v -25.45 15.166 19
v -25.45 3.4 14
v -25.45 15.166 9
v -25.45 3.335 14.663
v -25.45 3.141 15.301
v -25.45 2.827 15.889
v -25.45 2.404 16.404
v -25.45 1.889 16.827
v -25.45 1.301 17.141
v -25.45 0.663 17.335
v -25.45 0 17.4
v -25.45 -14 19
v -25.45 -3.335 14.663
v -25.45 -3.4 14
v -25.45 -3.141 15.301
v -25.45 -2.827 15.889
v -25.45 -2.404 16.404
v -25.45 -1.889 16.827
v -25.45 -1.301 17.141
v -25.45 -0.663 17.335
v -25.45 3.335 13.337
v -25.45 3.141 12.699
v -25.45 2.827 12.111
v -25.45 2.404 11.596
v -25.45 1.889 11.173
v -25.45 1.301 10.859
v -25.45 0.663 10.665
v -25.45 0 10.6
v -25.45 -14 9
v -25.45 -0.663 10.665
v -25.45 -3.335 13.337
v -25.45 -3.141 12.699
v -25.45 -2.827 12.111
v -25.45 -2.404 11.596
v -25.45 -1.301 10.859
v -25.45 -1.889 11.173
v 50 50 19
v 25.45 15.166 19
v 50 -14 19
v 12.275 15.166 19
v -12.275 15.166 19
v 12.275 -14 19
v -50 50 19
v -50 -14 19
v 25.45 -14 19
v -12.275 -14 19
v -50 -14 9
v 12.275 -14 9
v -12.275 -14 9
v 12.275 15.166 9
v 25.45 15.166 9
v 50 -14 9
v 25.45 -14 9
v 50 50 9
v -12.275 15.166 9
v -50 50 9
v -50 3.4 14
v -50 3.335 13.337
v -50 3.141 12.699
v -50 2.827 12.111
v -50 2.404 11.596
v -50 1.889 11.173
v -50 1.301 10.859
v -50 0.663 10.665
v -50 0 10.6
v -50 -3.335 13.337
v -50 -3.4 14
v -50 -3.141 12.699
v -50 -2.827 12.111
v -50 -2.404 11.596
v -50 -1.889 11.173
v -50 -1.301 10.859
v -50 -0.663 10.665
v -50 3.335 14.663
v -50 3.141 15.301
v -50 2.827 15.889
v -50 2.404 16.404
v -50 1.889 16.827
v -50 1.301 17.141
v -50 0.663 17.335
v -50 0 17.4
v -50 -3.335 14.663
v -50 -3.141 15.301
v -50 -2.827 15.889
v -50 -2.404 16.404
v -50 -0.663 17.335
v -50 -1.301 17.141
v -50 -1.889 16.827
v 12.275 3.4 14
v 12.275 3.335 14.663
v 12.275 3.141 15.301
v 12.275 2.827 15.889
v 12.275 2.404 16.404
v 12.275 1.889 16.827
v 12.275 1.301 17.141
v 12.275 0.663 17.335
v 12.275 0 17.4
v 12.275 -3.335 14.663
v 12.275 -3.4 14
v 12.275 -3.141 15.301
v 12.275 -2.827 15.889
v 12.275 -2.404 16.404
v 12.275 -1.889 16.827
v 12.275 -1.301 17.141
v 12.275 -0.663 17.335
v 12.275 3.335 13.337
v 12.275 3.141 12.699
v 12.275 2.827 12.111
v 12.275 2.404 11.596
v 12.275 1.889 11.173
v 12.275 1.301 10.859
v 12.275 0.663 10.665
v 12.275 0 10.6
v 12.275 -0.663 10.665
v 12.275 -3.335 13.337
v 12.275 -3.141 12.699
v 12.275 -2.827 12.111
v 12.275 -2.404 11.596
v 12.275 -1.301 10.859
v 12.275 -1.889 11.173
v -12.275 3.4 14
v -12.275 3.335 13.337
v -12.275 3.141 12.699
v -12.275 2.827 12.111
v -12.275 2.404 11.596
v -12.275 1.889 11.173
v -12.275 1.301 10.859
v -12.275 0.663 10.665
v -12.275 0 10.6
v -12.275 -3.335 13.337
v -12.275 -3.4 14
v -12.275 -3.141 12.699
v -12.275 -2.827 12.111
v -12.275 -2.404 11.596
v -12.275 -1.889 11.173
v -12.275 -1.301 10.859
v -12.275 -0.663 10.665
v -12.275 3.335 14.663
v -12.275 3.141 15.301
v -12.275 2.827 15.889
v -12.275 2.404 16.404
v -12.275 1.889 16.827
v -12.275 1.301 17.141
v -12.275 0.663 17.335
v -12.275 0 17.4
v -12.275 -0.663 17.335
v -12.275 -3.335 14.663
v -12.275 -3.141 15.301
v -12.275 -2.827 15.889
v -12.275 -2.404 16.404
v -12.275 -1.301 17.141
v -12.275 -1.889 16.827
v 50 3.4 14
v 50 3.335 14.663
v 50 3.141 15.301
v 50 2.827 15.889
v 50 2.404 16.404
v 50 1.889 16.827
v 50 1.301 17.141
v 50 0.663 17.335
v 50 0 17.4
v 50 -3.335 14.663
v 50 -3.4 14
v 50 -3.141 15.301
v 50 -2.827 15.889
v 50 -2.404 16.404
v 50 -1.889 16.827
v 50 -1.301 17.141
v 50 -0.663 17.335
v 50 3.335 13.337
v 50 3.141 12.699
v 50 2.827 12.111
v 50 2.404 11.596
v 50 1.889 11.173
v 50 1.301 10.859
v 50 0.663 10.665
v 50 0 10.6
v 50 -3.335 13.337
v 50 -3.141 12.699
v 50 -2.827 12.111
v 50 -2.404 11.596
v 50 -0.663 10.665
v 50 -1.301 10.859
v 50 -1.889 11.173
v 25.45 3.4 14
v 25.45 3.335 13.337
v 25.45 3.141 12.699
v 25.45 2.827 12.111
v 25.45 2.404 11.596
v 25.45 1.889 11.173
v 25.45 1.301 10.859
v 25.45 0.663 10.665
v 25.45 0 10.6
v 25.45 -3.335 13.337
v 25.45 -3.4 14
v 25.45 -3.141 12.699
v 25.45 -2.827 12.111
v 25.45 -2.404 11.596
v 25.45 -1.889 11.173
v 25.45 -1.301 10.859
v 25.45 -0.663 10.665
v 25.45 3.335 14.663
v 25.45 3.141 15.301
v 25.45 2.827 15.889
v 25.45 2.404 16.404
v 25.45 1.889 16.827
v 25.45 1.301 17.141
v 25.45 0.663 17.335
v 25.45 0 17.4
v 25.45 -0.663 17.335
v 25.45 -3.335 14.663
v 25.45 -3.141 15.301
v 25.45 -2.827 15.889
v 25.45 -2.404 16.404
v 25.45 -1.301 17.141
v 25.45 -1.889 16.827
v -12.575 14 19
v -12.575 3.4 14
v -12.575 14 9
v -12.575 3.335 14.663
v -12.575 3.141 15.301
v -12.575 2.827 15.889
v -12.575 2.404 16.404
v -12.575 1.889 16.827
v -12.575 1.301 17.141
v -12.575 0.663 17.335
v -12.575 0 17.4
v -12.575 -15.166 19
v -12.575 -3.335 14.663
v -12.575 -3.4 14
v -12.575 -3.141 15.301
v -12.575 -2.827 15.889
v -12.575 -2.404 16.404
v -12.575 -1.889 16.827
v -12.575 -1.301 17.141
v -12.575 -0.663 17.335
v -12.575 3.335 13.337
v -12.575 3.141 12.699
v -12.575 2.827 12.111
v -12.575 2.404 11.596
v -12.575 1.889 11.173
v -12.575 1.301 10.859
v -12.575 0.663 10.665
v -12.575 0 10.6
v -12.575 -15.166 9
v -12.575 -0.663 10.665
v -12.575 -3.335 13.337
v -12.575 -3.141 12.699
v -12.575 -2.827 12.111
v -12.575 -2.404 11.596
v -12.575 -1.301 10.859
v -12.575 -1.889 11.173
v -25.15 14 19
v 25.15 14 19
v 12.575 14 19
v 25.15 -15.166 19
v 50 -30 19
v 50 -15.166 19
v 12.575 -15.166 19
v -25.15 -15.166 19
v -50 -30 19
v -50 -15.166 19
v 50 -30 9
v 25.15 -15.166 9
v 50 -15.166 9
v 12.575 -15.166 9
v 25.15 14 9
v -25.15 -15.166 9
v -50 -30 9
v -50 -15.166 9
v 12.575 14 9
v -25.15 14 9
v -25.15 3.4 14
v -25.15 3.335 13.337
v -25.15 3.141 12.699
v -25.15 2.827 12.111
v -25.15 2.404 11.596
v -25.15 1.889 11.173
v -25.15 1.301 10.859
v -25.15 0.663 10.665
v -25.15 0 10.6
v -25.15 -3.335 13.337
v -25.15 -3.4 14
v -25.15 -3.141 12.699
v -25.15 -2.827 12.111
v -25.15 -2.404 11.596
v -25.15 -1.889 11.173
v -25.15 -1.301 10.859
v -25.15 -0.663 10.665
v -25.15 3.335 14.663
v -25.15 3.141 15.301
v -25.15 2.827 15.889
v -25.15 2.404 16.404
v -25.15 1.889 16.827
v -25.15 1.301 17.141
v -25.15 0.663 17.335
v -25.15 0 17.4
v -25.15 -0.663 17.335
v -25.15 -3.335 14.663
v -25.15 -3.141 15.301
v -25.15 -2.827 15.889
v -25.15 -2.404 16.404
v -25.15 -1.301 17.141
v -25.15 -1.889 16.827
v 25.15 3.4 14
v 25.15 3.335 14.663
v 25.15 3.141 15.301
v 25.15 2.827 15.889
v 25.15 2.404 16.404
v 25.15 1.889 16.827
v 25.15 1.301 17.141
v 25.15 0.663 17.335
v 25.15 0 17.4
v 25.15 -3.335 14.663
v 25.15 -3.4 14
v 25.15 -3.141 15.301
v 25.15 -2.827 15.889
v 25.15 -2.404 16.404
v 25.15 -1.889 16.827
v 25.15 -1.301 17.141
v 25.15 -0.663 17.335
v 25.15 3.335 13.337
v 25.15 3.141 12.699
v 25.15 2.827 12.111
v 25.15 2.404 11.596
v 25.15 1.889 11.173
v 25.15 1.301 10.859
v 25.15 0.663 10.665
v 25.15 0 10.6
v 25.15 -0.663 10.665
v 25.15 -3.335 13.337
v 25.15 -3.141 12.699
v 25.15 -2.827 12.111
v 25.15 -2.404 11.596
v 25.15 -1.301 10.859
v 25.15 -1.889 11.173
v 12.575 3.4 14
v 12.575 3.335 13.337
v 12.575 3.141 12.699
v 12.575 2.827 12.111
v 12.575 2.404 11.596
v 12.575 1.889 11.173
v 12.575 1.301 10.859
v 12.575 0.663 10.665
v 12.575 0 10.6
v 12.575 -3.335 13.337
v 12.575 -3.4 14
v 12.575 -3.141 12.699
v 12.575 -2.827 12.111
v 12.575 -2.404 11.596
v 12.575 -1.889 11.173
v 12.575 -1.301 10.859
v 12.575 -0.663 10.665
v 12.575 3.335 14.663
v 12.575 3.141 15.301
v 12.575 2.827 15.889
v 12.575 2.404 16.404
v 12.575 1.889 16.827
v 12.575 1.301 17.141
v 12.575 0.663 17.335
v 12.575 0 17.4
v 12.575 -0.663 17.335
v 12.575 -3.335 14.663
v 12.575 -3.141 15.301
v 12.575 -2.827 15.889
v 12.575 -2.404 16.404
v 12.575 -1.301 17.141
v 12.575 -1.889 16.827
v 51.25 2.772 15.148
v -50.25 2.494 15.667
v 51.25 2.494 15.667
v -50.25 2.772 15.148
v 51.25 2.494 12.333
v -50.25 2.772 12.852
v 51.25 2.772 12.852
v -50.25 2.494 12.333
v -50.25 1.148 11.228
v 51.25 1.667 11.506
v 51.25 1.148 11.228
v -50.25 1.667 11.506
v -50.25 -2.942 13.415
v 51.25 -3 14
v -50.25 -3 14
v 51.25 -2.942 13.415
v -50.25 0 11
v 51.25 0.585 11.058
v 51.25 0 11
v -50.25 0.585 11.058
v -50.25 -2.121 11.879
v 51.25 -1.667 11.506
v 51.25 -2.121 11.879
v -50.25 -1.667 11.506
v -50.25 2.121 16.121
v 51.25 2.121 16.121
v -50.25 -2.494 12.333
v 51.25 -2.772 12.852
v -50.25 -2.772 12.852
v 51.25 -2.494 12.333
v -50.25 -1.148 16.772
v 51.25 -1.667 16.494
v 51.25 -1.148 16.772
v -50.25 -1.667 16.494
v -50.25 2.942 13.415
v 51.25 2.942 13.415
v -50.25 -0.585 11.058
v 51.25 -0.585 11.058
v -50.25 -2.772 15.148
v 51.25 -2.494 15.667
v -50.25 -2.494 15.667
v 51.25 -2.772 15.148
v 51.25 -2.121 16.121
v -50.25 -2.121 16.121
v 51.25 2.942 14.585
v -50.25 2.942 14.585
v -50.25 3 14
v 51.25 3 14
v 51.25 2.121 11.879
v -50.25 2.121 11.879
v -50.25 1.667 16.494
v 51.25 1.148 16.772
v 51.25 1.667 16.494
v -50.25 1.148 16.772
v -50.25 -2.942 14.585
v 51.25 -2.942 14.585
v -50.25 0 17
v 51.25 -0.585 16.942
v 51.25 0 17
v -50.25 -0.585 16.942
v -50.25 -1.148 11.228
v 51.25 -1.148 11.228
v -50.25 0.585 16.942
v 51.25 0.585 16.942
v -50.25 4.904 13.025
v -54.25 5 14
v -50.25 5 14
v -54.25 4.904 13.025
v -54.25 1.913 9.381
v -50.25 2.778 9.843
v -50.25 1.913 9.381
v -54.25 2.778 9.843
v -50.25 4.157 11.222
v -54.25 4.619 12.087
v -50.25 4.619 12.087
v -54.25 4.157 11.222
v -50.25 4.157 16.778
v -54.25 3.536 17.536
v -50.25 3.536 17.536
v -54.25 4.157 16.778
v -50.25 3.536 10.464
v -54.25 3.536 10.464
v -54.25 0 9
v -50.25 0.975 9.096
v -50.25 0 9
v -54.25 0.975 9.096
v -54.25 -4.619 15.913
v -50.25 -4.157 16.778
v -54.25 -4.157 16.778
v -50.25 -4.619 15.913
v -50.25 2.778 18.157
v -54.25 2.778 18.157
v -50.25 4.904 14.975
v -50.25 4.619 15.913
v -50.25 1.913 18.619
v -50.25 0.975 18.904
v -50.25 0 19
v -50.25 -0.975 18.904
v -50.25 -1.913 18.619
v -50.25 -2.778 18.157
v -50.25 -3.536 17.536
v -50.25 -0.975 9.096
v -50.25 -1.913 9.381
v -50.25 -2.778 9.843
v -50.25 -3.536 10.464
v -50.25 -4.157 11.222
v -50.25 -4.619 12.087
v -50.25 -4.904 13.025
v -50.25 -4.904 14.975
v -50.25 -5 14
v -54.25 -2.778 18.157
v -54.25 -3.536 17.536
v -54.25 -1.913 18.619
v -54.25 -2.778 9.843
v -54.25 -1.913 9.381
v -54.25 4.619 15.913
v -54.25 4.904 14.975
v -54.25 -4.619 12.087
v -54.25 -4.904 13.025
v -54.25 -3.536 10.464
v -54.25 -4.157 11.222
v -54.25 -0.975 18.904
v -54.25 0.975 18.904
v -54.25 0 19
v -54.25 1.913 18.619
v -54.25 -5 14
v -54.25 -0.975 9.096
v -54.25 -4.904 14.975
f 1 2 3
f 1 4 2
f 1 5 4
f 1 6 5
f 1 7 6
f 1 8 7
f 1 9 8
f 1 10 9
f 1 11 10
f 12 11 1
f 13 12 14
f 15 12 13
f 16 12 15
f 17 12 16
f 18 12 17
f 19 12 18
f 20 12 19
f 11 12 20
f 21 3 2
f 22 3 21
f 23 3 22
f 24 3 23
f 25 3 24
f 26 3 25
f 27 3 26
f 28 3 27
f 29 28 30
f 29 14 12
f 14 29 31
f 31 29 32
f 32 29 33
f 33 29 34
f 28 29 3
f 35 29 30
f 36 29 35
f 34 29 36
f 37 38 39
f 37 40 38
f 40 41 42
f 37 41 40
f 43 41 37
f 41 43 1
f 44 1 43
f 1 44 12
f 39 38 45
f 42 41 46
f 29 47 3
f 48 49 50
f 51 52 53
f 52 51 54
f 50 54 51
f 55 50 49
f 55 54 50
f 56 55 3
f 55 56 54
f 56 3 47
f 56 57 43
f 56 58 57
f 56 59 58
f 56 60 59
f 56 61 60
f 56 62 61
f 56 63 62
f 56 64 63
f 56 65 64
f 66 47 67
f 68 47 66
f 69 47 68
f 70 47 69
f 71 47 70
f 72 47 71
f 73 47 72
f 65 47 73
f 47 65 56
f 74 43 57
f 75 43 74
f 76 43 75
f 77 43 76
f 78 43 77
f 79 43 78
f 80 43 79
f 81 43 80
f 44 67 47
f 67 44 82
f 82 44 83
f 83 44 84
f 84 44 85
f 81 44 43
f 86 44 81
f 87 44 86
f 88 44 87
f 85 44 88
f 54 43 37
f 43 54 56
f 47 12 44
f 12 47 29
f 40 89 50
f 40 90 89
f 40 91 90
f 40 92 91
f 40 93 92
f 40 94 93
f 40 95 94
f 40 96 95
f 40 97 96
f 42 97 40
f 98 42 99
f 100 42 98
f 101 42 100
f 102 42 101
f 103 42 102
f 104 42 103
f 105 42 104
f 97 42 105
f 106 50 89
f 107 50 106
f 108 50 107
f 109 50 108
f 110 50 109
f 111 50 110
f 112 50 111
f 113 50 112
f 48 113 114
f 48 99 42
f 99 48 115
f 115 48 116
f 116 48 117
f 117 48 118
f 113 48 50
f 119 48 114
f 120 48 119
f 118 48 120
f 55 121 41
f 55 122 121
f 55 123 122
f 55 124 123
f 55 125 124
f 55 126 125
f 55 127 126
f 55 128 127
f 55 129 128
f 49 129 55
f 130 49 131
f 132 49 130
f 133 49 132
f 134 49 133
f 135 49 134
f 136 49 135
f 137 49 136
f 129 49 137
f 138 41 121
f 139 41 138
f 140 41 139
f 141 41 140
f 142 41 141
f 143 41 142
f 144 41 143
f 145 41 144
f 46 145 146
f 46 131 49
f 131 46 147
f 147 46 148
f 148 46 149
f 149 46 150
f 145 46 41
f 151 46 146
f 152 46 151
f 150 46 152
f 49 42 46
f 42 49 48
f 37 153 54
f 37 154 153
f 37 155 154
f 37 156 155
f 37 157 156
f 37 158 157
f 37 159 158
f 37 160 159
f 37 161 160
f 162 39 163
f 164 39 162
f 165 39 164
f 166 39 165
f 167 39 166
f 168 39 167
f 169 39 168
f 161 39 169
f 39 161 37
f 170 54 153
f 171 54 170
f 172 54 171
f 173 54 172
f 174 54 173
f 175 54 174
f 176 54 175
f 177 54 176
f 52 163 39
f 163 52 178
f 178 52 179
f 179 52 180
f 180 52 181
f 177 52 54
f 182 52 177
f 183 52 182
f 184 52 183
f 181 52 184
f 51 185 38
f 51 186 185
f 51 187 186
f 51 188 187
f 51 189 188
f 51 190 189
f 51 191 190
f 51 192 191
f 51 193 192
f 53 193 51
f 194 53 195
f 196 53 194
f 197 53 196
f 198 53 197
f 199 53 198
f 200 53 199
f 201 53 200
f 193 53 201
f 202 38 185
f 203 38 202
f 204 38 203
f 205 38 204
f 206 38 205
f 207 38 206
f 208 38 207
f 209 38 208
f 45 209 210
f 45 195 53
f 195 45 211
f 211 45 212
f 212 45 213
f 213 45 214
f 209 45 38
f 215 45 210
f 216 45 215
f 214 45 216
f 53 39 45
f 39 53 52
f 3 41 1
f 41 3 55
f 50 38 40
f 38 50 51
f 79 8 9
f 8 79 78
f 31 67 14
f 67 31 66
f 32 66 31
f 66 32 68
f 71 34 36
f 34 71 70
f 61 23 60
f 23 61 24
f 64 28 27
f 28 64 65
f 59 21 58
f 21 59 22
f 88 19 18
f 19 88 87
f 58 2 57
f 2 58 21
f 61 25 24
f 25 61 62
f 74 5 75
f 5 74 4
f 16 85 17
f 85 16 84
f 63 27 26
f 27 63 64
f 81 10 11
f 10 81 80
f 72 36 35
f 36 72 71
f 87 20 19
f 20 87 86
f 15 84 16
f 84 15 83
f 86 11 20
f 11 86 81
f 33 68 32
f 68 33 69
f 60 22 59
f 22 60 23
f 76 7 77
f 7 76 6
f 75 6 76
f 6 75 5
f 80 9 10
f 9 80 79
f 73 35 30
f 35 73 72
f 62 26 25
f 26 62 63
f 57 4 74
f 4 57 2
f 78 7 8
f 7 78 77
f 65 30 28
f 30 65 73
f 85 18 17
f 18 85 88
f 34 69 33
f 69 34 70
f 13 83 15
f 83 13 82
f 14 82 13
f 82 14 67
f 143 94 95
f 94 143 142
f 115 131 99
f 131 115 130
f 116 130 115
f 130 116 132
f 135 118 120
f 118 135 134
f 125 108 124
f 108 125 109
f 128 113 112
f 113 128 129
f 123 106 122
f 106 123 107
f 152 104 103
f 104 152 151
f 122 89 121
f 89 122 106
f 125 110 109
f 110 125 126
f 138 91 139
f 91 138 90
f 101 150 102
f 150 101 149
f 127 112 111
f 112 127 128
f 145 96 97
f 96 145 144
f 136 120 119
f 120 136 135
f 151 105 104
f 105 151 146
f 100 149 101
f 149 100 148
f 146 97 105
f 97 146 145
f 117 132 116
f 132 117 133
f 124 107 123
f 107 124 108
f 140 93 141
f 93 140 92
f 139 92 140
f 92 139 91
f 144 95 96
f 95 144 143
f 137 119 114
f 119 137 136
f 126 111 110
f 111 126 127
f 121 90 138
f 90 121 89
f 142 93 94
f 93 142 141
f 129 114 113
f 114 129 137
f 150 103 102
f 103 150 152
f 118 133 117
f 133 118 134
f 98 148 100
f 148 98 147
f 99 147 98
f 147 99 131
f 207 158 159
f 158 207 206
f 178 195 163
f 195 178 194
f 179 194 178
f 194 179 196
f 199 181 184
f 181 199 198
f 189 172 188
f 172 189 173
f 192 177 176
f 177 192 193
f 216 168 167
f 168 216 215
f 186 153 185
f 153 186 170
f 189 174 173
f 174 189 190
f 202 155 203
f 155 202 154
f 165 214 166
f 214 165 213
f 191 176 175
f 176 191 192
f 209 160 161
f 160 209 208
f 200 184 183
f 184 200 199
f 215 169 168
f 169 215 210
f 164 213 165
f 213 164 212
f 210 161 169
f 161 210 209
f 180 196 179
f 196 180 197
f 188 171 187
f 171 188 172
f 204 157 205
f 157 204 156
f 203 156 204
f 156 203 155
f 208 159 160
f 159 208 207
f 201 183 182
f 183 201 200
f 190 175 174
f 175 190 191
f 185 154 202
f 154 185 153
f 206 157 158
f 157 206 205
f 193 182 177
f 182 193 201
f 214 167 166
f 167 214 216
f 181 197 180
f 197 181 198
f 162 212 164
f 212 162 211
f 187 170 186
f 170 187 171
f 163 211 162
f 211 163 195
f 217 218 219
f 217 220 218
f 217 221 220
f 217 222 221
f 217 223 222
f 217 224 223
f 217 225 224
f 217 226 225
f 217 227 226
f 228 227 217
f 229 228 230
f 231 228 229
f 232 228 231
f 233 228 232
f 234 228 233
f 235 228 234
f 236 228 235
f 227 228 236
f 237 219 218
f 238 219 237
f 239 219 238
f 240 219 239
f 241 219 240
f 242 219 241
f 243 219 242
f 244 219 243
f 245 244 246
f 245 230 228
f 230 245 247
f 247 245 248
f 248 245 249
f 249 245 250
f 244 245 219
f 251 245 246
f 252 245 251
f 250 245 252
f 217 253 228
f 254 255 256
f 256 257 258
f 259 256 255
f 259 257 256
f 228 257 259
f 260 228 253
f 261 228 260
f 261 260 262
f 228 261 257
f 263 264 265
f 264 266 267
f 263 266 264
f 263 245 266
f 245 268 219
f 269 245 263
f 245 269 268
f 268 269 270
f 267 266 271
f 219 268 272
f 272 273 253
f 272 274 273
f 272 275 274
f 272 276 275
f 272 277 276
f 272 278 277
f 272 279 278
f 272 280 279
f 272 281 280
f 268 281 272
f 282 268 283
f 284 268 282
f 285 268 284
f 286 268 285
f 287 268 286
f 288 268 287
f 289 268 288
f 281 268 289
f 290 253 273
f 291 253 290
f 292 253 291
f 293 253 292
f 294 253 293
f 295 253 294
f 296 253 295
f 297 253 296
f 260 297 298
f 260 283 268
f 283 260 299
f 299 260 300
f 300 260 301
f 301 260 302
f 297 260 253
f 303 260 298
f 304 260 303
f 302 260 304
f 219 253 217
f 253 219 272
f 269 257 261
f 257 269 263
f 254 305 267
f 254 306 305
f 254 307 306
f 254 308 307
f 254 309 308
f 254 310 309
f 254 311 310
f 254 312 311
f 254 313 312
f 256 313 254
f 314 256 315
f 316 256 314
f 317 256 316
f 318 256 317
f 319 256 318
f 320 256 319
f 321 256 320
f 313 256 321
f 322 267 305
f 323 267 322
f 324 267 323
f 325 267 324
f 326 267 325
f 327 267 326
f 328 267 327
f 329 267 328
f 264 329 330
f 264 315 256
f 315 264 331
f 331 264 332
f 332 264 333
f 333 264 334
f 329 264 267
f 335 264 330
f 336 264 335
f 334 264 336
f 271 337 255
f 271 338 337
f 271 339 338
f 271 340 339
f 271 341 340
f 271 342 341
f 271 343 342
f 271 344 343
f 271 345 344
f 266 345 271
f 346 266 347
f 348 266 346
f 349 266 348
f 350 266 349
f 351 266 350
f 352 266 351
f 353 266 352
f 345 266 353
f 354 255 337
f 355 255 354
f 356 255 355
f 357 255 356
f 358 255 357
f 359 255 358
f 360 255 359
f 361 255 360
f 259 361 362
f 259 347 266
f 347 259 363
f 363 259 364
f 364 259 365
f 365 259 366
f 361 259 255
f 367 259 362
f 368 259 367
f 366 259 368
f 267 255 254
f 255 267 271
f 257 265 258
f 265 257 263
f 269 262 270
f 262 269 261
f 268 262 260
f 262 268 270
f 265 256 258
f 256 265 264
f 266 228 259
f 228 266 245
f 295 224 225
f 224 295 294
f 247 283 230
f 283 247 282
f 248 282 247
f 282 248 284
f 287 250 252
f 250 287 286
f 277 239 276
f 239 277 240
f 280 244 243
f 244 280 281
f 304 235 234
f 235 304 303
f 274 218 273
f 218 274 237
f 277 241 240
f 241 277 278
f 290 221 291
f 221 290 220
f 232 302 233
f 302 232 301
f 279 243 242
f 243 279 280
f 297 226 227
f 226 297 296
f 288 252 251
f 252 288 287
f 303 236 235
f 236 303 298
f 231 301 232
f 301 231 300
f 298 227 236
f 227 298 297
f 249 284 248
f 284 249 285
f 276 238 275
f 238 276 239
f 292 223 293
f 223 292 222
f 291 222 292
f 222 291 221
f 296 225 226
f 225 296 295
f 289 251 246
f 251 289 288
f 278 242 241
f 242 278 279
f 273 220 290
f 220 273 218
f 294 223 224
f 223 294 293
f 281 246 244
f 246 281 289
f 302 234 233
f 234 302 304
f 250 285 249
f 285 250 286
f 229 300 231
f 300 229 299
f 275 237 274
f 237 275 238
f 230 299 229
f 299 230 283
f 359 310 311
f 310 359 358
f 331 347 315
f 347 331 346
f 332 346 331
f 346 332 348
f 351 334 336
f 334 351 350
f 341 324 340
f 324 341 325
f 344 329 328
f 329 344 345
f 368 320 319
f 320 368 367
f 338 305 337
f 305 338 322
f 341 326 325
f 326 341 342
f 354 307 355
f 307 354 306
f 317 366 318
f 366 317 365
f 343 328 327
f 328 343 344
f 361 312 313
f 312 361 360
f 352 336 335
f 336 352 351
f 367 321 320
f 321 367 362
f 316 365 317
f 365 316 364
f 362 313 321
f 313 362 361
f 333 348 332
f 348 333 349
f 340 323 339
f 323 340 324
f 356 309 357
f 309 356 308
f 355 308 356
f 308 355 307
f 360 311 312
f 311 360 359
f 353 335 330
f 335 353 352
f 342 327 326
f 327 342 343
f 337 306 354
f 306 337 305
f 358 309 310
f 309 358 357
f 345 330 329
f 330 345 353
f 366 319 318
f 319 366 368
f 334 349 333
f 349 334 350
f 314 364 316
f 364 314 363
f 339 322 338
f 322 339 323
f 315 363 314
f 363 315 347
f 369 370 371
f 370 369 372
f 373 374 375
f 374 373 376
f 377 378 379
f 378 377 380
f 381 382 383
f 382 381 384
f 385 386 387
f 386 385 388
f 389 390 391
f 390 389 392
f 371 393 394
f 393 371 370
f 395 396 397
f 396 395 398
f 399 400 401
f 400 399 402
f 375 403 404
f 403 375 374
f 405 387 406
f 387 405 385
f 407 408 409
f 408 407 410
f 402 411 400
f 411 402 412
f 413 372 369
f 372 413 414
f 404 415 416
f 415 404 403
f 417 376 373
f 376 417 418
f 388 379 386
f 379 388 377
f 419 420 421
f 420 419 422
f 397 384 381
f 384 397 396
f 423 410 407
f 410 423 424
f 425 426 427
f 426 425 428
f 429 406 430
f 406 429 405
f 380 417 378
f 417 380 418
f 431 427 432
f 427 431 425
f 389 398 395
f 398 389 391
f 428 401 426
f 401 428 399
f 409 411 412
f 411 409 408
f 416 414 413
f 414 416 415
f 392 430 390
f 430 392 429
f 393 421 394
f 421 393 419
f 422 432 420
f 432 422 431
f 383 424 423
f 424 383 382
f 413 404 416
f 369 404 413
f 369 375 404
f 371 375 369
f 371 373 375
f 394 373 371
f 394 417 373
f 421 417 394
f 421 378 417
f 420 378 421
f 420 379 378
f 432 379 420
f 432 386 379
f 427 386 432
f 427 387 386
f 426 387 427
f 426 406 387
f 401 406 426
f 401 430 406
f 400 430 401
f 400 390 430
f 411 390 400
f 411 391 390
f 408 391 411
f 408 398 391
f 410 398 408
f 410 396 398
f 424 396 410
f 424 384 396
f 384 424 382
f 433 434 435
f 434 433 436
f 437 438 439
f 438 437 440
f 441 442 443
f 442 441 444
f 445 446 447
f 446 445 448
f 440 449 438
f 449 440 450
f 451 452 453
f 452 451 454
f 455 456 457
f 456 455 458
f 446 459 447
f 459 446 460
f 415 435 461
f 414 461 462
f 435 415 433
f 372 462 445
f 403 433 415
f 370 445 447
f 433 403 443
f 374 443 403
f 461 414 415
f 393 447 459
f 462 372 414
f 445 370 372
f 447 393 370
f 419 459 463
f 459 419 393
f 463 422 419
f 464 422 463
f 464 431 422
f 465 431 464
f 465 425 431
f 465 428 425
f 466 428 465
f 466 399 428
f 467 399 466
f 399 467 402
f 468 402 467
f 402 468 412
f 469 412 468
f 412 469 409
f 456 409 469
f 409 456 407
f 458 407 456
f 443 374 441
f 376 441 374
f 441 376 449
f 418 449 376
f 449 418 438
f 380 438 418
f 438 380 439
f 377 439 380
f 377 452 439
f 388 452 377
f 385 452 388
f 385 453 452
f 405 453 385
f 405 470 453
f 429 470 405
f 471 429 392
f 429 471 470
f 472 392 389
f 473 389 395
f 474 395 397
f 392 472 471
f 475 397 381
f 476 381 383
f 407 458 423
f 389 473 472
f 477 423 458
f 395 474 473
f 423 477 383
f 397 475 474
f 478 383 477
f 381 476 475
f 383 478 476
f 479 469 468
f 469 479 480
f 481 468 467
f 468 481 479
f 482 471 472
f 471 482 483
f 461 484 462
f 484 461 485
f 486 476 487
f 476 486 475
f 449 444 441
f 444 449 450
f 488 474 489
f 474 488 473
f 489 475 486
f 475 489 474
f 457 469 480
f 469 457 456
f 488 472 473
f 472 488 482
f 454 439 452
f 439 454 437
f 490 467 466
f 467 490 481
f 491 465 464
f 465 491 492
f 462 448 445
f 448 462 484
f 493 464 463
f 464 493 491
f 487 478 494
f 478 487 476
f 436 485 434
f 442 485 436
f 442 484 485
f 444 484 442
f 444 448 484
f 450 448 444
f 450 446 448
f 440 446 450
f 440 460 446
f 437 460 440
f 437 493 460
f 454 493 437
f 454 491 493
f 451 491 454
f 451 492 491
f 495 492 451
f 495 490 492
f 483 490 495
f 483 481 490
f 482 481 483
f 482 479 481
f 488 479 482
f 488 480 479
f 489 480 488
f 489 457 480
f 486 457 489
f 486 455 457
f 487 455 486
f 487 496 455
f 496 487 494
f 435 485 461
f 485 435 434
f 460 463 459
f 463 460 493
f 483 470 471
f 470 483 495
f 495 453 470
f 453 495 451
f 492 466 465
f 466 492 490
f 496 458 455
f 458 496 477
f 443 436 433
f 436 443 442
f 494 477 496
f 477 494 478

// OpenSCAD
$fn = 32;

// ------------------------------------------------------------------------
// Butt hinge: hinge 100 mm, leaf swung 0 deg
// Every part is its own module, assembly() places every instance.
// ------------------------------------------------------------------------

// --- part 1 ---
module hinge_base() {
  difference() {
    union() {
      translate([-50, -14, -5]) cube([24.55, 64, 10]);
      translate([-12.275, -14, -5]) cube([24.55, 64, 10]);
      translate([25.45, -14, -5]) cube([24.55, 64, 10]);
      translate([-50, 15.166, -5]) cube([100, 34.834, 10]);
    }
    translate([-37.725, 0, 0]) rotate([0, 90, 0]) cylinder(h = 26.55, d = 6.8, center = true);
    translate([0, 0, 0]) rotate([0, 90, 0]) cylinder(h = 26.55, d = 6.8, center = true);
    translate([37.725, 0, 0]) rotate([0, 90, 0]) cylinder(h = 26.55, d = 6.8, center = true);
  }
}

// --- part 2 ---
module hinge_mover() {
  difference() {
    union() {
      translate([-25.15, -30, -5]) cube([12.575, 44, 10]);
      translate([12.575, -30, -5]) cube([12.575, 44, 10]);
      translate([-50, -30, -5]) cube([100, 14.834, 10]);
    }
    translate([-18.863, 0, 0]) rotate([0, 90, 0]) cylinder(h = 14.575, d = 6.8, center = true);
    translate([18.863, 0, 0]) rotate([0, 90, 0]) cylinder(h = 14.575, d = 6.8, center = true);
  }
}

// --- part 3 ---
module hinge_pin() {
  rotate([0, 90, 0]) cylinder(h = 102.5, d = 6, center = true);
  translate([-54.25, 0, 0]) rotate([0, 90, 0]) cylinder(h = 4, d = 10);
}

// --- assembly ---
module assembly() {
  color([0.80, 0.24, 0.20]) translate([0, 0, 14]) rotate([0, 0, 0]) hinge_base();
  color([0.20, 0.45, 0.75]) translate([0, 0, 14]) rotate([0, 0, 0]) hinge_mover();
  color([0.25, 0.62, 0.32]) translate([0, 0, 14]) rotate([0, 0, 0]) hinge_pin();
}

assembly();
